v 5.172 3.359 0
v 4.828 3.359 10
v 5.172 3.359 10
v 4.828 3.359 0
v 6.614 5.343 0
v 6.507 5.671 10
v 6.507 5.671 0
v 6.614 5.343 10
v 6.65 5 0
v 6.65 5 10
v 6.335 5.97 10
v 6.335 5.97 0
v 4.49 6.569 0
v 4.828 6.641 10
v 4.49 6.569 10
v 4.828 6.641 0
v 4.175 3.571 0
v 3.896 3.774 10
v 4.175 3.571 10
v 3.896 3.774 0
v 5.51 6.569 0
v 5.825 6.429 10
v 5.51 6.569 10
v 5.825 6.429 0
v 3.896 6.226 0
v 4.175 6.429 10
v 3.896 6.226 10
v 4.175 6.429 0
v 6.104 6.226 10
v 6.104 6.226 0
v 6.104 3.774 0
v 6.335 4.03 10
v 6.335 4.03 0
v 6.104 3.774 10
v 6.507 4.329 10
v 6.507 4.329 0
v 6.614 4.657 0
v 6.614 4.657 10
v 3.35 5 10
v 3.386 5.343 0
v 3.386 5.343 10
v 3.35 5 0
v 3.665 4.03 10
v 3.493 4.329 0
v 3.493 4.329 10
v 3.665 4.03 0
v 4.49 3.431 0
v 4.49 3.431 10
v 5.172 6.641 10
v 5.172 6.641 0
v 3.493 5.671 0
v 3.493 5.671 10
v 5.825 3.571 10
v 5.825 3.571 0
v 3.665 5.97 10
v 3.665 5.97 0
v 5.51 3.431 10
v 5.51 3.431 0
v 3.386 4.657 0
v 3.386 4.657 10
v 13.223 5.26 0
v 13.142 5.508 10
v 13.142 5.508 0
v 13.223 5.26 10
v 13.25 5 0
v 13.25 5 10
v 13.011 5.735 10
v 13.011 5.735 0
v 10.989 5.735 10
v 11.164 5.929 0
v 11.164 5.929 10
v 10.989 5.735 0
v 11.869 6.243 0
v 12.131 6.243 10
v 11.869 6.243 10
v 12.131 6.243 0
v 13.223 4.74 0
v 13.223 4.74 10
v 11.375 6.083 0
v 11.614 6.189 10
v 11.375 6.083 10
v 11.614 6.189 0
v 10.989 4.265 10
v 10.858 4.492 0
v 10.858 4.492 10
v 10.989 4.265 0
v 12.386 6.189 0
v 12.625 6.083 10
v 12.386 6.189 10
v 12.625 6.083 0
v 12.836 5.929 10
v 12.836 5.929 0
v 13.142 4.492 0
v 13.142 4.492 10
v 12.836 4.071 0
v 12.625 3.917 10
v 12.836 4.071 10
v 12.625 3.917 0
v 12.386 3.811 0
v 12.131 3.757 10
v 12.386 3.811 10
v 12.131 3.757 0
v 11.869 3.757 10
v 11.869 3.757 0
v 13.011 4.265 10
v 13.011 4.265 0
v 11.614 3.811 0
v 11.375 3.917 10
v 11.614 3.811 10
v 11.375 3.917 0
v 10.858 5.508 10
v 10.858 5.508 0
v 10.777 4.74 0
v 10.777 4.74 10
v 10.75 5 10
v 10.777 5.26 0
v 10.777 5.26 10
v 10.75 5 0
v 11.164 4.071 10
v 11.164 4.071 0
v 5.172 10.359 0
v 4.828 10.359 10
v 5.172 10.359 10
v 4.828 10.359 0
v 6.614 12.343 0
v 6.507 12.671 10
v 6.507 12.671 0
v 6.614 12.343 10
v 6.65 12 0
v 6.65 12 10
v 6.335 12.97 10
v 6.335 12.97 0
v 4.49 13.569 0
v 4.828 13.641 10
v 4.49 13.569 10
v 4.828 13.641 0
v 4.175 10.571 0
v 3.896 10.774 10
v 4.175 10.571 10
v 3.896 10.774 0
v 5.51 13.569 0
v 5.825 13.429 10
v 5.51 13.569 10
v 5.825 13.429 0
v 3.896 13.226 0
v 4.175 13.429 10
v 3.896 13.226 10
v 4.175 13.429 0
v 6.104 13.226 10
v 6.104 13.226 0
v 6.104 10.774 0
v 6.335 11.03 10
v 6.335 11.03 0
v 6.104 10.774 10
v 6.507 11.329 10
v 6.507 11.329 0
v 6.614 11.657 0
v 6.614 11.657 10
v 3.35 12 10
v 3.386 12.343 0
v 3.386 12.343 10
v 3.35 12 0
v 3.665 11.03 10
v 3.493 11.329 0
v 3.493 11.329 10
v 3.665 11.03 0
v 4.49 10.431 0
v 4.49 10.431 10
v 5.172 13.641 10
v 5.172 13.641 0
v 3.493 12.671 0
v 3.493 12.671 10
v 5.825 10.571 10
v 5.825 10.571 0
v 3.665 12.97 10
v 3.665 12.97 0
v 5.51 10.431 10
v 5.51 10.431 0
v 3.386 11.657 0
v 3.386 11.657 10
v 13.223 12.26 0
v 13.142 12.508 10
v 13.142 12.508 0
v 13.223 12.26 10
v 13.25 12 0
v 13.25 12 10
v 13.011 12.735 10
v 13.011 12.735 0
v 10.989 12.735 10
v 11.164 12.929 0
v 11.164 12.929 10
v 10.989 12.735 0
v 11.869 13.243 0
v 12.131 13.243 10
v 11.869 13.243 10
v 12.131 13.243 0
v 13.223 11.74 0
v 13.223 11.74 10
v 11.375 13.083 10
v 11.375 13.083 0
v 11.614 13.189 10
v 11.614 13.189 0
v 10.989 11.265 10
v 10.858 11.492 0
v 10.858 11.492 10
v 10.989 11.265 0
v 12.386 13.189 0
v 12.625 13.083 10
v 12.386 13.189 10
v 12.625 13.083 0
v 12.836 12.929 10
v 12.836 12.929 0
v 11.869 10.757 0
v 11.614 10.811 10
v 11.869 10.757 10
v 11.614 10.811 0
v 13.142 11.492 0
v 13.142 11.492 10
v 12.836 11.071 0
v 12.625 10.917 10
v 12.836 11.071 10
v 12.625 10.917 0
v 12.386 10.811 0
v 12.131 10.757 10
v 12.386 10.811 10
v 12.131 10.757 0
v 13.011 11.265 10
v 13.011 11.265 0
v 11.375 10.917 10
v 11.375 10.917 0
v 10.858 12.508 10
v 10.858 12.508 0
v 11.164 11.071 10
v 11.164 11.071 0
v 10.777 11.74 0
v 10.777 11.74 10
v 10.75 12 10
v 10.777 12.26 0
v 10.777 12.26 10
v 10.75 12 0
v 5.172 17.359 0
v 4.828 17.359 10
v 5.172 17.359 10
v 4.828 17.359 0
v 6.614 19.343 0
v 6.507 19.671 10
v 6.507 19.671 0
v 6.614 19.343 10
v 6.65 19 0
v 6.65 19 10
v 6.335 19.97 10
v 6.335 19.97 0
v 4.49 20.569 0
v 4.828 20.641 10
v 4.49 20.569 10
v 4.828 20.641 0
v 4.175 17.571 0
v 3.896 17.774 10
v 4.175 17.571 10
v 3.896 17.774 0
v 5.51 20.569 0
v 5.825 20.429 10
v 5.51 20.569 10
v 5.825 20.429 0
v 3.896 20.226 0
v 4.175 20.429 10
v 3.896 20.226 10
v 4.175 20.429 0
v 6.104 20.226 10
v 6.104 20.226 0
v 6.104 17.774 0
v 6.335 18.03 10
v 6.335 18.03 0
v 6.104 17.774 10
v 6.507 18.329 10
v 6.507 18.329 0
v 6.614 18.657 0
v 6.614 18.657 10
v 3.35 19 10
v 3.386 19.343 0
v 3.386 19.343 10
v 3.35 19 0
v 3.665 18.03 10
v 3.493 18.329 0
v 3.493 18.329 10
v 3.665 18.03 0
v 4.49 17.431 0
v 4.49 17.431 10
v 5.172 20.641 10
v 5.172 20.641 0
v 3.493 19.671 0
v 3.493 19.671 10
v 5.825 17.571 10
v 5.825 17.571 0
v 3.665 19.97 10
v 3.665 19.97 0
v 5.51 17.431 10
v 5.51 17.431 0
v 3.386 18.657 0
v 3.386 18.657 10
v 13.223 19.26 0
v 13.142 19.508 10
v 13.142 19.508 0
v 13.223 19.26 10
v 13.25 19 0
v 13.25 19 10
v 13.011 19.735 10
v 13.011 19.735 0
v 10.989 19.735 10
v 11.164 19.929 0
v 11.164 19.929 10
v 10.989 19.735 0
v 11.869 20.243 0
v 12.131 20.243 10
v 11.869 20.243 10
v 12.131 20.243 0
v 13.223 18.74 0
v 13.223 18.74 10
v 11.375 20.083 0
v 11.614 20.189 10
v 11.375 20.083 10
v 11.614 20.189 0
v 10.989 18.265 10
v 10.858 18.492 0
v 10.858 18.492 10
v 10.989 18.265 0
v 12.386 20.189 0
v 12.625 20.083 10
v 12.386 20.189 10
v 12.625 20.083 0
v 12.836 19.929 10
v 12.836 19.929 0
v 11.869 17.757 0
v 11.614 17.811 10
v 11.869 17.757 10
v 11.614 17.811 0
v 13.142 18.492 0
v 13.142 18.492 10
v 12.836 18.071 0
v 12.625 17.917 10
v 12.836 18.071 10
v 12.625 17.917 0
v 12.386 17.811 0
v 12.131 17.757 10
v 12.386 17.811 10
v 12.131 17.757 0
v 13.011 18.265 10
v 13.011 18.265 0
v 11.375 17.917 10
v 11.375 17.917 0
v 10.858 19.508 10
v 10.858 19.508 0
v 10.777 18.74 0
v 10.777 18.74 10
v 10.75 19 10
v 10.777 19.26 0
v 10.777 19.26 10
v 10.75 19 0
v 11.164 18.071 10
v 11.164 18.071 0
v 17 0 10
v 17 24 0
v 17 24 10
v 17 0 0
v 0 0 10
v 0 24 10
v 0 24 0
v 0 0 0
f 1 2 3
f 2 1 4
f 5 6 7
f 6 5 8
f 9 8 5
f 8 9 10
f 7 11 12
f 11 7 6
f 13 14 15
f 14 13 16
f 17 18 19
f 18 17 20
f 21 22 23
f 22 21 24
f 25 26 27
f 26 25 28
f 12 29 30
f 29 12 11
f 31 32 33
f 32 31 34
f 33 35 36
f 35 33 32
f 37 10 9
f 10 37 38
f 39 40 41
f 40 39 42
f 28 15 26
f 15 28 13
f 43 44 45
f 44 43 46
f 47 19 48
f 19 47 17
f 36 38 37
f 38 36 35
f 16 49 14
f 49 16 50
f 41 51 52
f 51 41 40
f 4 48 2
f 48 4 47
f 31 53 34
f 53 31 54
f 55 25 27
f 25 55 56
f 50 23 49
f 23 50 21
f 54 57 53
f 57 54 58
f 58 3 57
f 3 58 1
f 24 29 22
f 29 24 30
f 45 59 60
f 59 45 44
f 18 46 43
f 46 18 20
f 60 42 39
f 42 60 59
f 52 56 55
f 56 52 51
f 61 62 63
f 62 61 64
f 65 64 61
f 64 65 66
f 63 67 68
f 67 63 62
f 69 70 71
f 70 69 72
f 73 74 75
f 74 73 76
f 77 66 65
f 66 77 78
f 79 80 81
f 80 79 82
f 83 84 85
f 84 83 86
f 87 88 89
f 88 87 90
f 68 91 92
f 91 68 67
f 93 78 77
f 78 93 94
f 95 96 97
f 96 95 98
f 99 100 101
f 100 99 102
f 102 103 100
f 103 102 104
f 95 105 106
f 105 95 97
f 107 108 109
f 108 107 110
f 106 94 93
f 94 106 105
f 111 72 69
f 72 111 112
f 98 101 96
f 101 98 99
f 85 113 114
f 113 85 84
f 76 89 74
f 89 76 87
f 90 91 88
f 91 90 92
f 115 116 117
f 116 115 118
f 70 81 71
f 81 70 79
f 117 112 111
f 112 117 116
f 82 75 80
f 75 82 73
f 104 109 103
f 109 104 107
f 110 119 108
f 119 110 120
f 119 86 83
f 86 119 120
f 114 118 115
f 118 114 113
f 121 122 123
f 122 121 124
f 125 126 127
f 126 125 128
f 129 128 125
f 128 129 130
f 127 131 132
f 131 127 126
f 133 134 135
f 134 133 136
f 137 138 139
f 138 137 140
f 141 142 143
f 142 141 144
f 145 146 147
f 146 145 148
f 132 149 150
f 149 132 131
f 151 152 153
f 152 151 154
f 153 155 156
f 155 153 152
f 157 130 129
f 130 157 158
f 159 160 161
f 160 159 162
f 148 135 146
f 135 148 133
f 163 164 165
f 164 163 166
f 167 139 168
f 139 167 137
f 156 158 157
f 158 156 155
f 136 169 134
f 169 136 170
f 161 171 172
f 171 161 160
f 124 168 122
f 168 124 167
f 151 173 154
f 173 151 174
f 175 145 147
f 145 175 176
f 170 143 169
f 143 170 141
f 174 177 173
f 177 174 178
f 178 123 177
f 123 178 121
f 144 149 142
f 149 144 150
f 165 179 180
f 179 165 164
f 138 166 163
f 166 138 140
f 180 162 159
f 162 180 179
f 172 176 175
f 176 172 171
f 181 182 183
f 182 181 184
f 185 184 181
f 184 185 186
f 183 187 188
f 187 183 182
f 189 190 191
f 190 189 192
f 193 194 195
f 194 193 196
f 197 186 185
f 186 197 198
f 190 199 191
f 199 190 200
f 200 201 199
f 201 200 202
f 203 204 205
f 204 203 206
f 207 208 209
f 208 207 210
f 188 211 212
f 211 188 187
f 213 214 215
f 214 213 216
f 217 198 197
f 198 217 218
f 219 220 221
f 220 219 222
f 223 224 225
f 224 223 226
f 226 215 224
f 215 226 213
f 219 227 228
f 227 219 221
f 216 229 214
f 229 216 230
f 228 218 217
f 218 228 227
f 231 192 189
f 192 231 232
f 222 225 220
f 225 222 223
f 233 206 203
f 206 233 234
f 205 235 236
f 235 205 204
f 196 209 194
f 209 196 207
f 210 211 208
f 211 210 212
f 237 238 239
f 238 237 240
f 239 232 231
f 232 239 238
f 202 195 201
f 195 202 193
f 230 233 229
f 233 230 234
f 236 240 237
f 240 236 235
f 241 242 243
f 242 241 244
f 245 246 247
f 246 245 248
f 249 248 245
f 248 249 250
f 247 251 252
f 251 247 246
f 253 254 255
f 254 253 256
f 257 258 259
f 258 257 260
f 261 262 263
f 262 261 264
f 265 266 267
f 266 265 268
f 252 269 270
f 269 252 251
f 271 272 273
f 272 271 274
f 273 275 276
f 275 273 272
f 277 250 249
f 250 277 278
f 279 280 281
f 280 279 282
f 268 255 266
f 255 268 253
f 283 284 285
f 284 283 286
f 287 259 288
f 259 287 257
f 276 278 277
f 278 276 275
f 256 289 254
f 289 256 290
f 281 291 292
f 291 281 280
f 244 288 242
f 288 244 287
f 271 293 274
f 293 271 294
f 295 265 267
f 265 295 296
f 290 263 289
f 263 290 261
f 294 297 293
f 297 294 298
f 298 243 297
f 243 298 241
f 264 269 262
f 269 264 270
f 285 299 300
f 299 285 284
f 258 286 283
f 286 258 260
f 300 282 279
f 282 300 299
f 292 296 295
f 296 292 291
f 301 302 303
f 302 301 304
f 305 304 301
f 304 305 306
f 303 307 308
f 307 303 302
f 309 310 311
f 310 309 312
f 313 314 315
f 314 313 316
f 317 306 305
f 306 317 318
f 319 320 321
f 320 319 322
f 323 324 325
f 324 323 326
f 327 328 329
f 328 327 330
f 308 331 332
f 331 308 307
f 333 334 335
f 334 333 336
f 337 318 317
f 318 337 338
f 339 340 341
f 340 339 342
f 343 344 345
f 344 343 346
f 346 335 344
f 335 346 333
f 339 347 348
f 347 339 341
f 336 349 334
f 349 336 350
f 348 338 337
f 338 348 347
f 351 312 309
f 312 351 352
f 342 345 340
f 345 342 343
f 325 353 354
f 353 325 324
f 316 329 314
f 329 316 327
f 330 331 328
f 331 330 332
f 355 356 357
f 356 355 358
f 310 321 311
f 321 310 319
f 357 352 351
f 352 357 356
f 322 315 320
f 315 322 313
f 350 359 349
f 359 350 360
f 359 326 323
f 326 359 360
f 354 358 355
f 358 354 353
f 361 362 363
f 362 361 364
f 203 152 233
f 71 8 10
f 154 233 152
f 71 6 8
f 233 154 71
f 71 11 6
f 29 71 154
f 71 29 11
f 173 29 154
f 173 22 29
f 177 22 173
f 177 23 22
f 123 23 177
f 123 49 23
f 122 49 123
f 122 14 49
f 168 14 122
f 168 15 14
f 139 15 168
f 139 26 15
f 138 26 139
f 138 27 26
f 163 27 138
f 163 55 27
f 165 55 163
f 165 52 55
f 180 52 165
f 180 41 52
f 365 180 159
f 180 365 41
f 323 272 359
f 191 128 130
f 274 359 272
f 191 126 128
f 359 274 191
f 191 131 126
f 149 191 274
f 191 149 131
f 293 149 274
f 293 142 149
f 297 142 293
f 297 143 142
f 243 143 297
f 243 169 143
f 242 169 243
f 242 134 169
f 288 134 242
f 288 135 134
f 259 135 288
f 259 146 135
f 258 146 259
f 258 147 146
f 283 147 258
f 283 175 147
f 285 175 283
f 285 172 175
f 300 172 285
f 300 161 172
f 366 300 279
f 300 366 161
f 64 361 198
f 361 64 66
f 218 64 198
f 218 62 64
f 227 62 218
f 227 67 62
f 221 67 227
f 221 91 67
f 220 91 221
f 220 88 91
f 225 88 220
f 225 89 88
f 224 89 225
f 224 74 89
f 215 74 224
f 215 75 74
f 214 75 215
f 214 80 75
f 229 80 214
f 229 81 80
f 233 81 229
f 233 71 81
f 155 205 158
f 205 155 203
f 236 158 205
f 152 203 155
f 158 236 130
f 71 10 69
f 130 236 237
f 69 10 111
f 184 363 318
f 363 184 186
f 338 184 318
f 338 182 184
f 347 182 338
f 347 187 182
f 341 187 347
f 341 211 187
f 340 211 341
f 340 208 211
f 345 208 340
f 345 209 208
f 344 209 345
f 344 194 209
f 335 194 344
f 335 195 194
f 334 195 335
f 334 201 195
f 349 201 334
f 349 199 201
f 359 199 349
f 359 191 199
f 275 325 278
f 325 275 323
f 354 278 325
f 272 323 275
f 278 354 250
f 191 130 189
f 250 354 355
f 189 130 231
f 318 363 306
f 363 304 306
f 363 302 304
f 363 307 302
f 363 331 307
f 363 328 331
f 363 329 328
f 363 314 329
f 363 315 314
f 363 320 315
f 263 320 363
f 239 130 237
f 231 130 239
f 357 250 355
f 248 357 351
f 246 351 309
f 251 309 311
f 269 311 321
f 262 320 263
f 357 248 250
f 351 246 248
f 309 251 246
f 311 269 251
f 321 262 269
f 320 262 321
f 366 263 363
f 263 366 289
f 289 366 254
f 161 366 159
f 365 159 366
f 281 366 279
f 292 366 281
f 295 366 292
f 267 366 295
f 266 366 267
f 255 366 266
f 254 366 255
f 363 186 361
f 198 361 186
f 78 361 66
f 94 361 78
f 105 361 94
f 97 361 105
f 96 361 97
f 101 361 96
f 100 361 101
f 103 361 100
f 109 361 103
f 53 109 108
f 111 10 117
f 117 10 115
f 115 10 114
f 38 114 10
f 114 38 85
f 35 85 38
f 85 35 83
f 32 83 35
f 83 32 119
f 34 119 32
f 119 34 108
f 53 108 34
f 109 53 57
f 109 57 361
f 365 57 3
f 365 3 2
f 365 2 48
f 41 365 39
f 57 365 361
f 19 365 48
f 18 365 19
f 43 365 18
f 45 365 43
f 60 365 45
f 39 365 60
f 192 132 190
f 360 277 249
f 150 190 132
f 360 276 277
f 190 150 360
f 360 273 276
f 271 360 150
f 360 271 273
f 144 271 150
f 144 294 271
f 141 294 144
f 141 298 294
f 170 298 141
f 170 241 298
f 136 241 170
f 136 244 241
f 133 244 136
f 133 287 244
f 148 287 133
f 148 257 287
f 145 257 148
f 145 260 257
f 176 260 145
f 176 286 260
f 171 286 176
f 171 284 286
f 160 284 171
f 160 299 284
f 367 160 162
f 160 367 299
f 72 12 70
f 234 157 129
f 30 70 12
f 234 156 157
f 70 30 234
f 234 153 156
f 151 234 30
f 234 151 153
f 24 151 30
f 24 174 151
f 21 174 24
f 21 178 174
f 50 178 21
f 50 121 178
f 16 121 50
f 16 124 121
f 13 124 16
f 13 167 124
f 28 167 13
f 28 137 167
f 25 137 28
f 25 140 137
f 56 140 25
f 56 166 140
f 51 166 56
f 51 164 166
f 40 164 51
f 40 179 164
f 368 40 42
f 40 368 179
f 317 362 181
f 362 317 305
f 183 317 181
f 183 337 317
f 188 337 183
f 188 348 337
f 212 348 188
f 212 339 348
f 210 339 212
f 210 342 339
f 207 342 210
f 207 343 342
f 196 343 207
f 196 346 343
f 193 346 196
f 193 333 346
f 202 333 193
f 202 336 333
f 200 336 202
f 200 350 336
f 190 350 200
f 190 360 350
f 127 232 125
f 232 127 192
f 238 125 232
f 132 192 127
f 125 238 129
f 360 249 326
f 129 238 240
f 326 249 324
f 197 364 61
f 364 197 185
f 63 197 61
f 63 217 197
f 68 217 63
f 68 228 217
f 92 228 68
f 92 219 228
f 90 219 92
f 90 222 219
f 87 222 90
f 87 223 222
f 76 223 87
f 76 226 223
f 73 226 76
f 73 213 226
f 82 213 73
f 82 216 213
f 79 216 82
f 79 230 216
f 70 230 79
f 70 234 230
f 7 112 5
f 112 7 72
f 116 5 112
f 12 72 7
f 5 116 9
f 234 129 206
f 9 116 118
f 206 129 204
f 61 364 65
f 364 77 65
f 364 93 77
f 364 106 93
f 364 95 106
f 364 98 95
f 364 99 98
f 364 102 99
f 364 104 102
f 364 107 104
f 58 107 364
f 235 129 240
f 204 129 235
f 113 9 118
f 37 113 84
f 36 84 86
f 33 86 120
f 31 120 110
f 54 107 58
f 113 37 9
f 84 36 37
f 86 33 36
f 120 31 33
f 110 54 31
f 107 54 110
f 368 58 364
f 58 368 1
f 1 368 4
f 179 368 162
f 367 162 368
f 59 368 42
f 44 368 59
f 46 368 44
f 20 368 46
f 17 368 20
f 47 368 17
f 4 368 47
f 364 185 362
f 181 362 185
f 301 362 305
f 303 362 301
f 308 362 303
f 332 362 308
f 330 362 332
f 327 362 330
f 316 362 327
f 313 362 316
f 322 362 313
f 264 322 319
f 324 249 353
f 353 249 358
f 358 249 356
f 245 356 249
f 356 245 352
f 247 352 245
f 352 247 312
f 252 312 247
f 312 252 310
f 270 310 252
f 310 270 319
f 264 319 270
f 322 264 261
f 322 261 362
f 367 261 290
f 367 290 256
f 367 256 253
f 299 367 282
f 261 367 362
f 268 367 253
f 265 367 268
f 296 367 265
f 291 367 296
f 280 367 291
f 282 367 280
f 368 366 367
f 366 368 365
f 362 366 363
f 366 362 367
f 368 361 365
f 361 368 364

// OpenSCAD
// file: ../Variables/Threading.scad
// created by IndiePandaaaaa | Lukas

// source M3-M12: https://de.wikipedia.org/wiki/Kernloch
// source UNC14-UNC38: https://gewindeaufschneider.de/blog/stativgewinde/

// UNC14 => UNC 1/4″ 20  |   UNC38 => UNC 3/8″ 16

function core_hole_M3() = 2.5;

function core_hole_M4() = 3.3;

function core_hole_M5() = 4.2;

function core_hole_M6() = 5.0;

function core_hole_M8() = 6.8;

function core_hole_M10() = 8.5;

function core_hole_M12() = 10.2;

function core_hole_UNC14() = 5.35;

function core_hole_UNC38() = 8.25;
// main file
// created by IndiePandaaaaa | Lukas

use <../Variables/Threading.scad>

difference() {
    cube([17, 24, 10]);
    for (i = [0:2]) {
        translate([5, 5 + 7 * i, - 2]) {
            cylinder(15, d = core_hole_M4(), $fs = 0.1);
            translate([7, 0, 0])
                cylinder(15, d = core_hole_M3(), $fs = 0.1);
        }
    }
}
